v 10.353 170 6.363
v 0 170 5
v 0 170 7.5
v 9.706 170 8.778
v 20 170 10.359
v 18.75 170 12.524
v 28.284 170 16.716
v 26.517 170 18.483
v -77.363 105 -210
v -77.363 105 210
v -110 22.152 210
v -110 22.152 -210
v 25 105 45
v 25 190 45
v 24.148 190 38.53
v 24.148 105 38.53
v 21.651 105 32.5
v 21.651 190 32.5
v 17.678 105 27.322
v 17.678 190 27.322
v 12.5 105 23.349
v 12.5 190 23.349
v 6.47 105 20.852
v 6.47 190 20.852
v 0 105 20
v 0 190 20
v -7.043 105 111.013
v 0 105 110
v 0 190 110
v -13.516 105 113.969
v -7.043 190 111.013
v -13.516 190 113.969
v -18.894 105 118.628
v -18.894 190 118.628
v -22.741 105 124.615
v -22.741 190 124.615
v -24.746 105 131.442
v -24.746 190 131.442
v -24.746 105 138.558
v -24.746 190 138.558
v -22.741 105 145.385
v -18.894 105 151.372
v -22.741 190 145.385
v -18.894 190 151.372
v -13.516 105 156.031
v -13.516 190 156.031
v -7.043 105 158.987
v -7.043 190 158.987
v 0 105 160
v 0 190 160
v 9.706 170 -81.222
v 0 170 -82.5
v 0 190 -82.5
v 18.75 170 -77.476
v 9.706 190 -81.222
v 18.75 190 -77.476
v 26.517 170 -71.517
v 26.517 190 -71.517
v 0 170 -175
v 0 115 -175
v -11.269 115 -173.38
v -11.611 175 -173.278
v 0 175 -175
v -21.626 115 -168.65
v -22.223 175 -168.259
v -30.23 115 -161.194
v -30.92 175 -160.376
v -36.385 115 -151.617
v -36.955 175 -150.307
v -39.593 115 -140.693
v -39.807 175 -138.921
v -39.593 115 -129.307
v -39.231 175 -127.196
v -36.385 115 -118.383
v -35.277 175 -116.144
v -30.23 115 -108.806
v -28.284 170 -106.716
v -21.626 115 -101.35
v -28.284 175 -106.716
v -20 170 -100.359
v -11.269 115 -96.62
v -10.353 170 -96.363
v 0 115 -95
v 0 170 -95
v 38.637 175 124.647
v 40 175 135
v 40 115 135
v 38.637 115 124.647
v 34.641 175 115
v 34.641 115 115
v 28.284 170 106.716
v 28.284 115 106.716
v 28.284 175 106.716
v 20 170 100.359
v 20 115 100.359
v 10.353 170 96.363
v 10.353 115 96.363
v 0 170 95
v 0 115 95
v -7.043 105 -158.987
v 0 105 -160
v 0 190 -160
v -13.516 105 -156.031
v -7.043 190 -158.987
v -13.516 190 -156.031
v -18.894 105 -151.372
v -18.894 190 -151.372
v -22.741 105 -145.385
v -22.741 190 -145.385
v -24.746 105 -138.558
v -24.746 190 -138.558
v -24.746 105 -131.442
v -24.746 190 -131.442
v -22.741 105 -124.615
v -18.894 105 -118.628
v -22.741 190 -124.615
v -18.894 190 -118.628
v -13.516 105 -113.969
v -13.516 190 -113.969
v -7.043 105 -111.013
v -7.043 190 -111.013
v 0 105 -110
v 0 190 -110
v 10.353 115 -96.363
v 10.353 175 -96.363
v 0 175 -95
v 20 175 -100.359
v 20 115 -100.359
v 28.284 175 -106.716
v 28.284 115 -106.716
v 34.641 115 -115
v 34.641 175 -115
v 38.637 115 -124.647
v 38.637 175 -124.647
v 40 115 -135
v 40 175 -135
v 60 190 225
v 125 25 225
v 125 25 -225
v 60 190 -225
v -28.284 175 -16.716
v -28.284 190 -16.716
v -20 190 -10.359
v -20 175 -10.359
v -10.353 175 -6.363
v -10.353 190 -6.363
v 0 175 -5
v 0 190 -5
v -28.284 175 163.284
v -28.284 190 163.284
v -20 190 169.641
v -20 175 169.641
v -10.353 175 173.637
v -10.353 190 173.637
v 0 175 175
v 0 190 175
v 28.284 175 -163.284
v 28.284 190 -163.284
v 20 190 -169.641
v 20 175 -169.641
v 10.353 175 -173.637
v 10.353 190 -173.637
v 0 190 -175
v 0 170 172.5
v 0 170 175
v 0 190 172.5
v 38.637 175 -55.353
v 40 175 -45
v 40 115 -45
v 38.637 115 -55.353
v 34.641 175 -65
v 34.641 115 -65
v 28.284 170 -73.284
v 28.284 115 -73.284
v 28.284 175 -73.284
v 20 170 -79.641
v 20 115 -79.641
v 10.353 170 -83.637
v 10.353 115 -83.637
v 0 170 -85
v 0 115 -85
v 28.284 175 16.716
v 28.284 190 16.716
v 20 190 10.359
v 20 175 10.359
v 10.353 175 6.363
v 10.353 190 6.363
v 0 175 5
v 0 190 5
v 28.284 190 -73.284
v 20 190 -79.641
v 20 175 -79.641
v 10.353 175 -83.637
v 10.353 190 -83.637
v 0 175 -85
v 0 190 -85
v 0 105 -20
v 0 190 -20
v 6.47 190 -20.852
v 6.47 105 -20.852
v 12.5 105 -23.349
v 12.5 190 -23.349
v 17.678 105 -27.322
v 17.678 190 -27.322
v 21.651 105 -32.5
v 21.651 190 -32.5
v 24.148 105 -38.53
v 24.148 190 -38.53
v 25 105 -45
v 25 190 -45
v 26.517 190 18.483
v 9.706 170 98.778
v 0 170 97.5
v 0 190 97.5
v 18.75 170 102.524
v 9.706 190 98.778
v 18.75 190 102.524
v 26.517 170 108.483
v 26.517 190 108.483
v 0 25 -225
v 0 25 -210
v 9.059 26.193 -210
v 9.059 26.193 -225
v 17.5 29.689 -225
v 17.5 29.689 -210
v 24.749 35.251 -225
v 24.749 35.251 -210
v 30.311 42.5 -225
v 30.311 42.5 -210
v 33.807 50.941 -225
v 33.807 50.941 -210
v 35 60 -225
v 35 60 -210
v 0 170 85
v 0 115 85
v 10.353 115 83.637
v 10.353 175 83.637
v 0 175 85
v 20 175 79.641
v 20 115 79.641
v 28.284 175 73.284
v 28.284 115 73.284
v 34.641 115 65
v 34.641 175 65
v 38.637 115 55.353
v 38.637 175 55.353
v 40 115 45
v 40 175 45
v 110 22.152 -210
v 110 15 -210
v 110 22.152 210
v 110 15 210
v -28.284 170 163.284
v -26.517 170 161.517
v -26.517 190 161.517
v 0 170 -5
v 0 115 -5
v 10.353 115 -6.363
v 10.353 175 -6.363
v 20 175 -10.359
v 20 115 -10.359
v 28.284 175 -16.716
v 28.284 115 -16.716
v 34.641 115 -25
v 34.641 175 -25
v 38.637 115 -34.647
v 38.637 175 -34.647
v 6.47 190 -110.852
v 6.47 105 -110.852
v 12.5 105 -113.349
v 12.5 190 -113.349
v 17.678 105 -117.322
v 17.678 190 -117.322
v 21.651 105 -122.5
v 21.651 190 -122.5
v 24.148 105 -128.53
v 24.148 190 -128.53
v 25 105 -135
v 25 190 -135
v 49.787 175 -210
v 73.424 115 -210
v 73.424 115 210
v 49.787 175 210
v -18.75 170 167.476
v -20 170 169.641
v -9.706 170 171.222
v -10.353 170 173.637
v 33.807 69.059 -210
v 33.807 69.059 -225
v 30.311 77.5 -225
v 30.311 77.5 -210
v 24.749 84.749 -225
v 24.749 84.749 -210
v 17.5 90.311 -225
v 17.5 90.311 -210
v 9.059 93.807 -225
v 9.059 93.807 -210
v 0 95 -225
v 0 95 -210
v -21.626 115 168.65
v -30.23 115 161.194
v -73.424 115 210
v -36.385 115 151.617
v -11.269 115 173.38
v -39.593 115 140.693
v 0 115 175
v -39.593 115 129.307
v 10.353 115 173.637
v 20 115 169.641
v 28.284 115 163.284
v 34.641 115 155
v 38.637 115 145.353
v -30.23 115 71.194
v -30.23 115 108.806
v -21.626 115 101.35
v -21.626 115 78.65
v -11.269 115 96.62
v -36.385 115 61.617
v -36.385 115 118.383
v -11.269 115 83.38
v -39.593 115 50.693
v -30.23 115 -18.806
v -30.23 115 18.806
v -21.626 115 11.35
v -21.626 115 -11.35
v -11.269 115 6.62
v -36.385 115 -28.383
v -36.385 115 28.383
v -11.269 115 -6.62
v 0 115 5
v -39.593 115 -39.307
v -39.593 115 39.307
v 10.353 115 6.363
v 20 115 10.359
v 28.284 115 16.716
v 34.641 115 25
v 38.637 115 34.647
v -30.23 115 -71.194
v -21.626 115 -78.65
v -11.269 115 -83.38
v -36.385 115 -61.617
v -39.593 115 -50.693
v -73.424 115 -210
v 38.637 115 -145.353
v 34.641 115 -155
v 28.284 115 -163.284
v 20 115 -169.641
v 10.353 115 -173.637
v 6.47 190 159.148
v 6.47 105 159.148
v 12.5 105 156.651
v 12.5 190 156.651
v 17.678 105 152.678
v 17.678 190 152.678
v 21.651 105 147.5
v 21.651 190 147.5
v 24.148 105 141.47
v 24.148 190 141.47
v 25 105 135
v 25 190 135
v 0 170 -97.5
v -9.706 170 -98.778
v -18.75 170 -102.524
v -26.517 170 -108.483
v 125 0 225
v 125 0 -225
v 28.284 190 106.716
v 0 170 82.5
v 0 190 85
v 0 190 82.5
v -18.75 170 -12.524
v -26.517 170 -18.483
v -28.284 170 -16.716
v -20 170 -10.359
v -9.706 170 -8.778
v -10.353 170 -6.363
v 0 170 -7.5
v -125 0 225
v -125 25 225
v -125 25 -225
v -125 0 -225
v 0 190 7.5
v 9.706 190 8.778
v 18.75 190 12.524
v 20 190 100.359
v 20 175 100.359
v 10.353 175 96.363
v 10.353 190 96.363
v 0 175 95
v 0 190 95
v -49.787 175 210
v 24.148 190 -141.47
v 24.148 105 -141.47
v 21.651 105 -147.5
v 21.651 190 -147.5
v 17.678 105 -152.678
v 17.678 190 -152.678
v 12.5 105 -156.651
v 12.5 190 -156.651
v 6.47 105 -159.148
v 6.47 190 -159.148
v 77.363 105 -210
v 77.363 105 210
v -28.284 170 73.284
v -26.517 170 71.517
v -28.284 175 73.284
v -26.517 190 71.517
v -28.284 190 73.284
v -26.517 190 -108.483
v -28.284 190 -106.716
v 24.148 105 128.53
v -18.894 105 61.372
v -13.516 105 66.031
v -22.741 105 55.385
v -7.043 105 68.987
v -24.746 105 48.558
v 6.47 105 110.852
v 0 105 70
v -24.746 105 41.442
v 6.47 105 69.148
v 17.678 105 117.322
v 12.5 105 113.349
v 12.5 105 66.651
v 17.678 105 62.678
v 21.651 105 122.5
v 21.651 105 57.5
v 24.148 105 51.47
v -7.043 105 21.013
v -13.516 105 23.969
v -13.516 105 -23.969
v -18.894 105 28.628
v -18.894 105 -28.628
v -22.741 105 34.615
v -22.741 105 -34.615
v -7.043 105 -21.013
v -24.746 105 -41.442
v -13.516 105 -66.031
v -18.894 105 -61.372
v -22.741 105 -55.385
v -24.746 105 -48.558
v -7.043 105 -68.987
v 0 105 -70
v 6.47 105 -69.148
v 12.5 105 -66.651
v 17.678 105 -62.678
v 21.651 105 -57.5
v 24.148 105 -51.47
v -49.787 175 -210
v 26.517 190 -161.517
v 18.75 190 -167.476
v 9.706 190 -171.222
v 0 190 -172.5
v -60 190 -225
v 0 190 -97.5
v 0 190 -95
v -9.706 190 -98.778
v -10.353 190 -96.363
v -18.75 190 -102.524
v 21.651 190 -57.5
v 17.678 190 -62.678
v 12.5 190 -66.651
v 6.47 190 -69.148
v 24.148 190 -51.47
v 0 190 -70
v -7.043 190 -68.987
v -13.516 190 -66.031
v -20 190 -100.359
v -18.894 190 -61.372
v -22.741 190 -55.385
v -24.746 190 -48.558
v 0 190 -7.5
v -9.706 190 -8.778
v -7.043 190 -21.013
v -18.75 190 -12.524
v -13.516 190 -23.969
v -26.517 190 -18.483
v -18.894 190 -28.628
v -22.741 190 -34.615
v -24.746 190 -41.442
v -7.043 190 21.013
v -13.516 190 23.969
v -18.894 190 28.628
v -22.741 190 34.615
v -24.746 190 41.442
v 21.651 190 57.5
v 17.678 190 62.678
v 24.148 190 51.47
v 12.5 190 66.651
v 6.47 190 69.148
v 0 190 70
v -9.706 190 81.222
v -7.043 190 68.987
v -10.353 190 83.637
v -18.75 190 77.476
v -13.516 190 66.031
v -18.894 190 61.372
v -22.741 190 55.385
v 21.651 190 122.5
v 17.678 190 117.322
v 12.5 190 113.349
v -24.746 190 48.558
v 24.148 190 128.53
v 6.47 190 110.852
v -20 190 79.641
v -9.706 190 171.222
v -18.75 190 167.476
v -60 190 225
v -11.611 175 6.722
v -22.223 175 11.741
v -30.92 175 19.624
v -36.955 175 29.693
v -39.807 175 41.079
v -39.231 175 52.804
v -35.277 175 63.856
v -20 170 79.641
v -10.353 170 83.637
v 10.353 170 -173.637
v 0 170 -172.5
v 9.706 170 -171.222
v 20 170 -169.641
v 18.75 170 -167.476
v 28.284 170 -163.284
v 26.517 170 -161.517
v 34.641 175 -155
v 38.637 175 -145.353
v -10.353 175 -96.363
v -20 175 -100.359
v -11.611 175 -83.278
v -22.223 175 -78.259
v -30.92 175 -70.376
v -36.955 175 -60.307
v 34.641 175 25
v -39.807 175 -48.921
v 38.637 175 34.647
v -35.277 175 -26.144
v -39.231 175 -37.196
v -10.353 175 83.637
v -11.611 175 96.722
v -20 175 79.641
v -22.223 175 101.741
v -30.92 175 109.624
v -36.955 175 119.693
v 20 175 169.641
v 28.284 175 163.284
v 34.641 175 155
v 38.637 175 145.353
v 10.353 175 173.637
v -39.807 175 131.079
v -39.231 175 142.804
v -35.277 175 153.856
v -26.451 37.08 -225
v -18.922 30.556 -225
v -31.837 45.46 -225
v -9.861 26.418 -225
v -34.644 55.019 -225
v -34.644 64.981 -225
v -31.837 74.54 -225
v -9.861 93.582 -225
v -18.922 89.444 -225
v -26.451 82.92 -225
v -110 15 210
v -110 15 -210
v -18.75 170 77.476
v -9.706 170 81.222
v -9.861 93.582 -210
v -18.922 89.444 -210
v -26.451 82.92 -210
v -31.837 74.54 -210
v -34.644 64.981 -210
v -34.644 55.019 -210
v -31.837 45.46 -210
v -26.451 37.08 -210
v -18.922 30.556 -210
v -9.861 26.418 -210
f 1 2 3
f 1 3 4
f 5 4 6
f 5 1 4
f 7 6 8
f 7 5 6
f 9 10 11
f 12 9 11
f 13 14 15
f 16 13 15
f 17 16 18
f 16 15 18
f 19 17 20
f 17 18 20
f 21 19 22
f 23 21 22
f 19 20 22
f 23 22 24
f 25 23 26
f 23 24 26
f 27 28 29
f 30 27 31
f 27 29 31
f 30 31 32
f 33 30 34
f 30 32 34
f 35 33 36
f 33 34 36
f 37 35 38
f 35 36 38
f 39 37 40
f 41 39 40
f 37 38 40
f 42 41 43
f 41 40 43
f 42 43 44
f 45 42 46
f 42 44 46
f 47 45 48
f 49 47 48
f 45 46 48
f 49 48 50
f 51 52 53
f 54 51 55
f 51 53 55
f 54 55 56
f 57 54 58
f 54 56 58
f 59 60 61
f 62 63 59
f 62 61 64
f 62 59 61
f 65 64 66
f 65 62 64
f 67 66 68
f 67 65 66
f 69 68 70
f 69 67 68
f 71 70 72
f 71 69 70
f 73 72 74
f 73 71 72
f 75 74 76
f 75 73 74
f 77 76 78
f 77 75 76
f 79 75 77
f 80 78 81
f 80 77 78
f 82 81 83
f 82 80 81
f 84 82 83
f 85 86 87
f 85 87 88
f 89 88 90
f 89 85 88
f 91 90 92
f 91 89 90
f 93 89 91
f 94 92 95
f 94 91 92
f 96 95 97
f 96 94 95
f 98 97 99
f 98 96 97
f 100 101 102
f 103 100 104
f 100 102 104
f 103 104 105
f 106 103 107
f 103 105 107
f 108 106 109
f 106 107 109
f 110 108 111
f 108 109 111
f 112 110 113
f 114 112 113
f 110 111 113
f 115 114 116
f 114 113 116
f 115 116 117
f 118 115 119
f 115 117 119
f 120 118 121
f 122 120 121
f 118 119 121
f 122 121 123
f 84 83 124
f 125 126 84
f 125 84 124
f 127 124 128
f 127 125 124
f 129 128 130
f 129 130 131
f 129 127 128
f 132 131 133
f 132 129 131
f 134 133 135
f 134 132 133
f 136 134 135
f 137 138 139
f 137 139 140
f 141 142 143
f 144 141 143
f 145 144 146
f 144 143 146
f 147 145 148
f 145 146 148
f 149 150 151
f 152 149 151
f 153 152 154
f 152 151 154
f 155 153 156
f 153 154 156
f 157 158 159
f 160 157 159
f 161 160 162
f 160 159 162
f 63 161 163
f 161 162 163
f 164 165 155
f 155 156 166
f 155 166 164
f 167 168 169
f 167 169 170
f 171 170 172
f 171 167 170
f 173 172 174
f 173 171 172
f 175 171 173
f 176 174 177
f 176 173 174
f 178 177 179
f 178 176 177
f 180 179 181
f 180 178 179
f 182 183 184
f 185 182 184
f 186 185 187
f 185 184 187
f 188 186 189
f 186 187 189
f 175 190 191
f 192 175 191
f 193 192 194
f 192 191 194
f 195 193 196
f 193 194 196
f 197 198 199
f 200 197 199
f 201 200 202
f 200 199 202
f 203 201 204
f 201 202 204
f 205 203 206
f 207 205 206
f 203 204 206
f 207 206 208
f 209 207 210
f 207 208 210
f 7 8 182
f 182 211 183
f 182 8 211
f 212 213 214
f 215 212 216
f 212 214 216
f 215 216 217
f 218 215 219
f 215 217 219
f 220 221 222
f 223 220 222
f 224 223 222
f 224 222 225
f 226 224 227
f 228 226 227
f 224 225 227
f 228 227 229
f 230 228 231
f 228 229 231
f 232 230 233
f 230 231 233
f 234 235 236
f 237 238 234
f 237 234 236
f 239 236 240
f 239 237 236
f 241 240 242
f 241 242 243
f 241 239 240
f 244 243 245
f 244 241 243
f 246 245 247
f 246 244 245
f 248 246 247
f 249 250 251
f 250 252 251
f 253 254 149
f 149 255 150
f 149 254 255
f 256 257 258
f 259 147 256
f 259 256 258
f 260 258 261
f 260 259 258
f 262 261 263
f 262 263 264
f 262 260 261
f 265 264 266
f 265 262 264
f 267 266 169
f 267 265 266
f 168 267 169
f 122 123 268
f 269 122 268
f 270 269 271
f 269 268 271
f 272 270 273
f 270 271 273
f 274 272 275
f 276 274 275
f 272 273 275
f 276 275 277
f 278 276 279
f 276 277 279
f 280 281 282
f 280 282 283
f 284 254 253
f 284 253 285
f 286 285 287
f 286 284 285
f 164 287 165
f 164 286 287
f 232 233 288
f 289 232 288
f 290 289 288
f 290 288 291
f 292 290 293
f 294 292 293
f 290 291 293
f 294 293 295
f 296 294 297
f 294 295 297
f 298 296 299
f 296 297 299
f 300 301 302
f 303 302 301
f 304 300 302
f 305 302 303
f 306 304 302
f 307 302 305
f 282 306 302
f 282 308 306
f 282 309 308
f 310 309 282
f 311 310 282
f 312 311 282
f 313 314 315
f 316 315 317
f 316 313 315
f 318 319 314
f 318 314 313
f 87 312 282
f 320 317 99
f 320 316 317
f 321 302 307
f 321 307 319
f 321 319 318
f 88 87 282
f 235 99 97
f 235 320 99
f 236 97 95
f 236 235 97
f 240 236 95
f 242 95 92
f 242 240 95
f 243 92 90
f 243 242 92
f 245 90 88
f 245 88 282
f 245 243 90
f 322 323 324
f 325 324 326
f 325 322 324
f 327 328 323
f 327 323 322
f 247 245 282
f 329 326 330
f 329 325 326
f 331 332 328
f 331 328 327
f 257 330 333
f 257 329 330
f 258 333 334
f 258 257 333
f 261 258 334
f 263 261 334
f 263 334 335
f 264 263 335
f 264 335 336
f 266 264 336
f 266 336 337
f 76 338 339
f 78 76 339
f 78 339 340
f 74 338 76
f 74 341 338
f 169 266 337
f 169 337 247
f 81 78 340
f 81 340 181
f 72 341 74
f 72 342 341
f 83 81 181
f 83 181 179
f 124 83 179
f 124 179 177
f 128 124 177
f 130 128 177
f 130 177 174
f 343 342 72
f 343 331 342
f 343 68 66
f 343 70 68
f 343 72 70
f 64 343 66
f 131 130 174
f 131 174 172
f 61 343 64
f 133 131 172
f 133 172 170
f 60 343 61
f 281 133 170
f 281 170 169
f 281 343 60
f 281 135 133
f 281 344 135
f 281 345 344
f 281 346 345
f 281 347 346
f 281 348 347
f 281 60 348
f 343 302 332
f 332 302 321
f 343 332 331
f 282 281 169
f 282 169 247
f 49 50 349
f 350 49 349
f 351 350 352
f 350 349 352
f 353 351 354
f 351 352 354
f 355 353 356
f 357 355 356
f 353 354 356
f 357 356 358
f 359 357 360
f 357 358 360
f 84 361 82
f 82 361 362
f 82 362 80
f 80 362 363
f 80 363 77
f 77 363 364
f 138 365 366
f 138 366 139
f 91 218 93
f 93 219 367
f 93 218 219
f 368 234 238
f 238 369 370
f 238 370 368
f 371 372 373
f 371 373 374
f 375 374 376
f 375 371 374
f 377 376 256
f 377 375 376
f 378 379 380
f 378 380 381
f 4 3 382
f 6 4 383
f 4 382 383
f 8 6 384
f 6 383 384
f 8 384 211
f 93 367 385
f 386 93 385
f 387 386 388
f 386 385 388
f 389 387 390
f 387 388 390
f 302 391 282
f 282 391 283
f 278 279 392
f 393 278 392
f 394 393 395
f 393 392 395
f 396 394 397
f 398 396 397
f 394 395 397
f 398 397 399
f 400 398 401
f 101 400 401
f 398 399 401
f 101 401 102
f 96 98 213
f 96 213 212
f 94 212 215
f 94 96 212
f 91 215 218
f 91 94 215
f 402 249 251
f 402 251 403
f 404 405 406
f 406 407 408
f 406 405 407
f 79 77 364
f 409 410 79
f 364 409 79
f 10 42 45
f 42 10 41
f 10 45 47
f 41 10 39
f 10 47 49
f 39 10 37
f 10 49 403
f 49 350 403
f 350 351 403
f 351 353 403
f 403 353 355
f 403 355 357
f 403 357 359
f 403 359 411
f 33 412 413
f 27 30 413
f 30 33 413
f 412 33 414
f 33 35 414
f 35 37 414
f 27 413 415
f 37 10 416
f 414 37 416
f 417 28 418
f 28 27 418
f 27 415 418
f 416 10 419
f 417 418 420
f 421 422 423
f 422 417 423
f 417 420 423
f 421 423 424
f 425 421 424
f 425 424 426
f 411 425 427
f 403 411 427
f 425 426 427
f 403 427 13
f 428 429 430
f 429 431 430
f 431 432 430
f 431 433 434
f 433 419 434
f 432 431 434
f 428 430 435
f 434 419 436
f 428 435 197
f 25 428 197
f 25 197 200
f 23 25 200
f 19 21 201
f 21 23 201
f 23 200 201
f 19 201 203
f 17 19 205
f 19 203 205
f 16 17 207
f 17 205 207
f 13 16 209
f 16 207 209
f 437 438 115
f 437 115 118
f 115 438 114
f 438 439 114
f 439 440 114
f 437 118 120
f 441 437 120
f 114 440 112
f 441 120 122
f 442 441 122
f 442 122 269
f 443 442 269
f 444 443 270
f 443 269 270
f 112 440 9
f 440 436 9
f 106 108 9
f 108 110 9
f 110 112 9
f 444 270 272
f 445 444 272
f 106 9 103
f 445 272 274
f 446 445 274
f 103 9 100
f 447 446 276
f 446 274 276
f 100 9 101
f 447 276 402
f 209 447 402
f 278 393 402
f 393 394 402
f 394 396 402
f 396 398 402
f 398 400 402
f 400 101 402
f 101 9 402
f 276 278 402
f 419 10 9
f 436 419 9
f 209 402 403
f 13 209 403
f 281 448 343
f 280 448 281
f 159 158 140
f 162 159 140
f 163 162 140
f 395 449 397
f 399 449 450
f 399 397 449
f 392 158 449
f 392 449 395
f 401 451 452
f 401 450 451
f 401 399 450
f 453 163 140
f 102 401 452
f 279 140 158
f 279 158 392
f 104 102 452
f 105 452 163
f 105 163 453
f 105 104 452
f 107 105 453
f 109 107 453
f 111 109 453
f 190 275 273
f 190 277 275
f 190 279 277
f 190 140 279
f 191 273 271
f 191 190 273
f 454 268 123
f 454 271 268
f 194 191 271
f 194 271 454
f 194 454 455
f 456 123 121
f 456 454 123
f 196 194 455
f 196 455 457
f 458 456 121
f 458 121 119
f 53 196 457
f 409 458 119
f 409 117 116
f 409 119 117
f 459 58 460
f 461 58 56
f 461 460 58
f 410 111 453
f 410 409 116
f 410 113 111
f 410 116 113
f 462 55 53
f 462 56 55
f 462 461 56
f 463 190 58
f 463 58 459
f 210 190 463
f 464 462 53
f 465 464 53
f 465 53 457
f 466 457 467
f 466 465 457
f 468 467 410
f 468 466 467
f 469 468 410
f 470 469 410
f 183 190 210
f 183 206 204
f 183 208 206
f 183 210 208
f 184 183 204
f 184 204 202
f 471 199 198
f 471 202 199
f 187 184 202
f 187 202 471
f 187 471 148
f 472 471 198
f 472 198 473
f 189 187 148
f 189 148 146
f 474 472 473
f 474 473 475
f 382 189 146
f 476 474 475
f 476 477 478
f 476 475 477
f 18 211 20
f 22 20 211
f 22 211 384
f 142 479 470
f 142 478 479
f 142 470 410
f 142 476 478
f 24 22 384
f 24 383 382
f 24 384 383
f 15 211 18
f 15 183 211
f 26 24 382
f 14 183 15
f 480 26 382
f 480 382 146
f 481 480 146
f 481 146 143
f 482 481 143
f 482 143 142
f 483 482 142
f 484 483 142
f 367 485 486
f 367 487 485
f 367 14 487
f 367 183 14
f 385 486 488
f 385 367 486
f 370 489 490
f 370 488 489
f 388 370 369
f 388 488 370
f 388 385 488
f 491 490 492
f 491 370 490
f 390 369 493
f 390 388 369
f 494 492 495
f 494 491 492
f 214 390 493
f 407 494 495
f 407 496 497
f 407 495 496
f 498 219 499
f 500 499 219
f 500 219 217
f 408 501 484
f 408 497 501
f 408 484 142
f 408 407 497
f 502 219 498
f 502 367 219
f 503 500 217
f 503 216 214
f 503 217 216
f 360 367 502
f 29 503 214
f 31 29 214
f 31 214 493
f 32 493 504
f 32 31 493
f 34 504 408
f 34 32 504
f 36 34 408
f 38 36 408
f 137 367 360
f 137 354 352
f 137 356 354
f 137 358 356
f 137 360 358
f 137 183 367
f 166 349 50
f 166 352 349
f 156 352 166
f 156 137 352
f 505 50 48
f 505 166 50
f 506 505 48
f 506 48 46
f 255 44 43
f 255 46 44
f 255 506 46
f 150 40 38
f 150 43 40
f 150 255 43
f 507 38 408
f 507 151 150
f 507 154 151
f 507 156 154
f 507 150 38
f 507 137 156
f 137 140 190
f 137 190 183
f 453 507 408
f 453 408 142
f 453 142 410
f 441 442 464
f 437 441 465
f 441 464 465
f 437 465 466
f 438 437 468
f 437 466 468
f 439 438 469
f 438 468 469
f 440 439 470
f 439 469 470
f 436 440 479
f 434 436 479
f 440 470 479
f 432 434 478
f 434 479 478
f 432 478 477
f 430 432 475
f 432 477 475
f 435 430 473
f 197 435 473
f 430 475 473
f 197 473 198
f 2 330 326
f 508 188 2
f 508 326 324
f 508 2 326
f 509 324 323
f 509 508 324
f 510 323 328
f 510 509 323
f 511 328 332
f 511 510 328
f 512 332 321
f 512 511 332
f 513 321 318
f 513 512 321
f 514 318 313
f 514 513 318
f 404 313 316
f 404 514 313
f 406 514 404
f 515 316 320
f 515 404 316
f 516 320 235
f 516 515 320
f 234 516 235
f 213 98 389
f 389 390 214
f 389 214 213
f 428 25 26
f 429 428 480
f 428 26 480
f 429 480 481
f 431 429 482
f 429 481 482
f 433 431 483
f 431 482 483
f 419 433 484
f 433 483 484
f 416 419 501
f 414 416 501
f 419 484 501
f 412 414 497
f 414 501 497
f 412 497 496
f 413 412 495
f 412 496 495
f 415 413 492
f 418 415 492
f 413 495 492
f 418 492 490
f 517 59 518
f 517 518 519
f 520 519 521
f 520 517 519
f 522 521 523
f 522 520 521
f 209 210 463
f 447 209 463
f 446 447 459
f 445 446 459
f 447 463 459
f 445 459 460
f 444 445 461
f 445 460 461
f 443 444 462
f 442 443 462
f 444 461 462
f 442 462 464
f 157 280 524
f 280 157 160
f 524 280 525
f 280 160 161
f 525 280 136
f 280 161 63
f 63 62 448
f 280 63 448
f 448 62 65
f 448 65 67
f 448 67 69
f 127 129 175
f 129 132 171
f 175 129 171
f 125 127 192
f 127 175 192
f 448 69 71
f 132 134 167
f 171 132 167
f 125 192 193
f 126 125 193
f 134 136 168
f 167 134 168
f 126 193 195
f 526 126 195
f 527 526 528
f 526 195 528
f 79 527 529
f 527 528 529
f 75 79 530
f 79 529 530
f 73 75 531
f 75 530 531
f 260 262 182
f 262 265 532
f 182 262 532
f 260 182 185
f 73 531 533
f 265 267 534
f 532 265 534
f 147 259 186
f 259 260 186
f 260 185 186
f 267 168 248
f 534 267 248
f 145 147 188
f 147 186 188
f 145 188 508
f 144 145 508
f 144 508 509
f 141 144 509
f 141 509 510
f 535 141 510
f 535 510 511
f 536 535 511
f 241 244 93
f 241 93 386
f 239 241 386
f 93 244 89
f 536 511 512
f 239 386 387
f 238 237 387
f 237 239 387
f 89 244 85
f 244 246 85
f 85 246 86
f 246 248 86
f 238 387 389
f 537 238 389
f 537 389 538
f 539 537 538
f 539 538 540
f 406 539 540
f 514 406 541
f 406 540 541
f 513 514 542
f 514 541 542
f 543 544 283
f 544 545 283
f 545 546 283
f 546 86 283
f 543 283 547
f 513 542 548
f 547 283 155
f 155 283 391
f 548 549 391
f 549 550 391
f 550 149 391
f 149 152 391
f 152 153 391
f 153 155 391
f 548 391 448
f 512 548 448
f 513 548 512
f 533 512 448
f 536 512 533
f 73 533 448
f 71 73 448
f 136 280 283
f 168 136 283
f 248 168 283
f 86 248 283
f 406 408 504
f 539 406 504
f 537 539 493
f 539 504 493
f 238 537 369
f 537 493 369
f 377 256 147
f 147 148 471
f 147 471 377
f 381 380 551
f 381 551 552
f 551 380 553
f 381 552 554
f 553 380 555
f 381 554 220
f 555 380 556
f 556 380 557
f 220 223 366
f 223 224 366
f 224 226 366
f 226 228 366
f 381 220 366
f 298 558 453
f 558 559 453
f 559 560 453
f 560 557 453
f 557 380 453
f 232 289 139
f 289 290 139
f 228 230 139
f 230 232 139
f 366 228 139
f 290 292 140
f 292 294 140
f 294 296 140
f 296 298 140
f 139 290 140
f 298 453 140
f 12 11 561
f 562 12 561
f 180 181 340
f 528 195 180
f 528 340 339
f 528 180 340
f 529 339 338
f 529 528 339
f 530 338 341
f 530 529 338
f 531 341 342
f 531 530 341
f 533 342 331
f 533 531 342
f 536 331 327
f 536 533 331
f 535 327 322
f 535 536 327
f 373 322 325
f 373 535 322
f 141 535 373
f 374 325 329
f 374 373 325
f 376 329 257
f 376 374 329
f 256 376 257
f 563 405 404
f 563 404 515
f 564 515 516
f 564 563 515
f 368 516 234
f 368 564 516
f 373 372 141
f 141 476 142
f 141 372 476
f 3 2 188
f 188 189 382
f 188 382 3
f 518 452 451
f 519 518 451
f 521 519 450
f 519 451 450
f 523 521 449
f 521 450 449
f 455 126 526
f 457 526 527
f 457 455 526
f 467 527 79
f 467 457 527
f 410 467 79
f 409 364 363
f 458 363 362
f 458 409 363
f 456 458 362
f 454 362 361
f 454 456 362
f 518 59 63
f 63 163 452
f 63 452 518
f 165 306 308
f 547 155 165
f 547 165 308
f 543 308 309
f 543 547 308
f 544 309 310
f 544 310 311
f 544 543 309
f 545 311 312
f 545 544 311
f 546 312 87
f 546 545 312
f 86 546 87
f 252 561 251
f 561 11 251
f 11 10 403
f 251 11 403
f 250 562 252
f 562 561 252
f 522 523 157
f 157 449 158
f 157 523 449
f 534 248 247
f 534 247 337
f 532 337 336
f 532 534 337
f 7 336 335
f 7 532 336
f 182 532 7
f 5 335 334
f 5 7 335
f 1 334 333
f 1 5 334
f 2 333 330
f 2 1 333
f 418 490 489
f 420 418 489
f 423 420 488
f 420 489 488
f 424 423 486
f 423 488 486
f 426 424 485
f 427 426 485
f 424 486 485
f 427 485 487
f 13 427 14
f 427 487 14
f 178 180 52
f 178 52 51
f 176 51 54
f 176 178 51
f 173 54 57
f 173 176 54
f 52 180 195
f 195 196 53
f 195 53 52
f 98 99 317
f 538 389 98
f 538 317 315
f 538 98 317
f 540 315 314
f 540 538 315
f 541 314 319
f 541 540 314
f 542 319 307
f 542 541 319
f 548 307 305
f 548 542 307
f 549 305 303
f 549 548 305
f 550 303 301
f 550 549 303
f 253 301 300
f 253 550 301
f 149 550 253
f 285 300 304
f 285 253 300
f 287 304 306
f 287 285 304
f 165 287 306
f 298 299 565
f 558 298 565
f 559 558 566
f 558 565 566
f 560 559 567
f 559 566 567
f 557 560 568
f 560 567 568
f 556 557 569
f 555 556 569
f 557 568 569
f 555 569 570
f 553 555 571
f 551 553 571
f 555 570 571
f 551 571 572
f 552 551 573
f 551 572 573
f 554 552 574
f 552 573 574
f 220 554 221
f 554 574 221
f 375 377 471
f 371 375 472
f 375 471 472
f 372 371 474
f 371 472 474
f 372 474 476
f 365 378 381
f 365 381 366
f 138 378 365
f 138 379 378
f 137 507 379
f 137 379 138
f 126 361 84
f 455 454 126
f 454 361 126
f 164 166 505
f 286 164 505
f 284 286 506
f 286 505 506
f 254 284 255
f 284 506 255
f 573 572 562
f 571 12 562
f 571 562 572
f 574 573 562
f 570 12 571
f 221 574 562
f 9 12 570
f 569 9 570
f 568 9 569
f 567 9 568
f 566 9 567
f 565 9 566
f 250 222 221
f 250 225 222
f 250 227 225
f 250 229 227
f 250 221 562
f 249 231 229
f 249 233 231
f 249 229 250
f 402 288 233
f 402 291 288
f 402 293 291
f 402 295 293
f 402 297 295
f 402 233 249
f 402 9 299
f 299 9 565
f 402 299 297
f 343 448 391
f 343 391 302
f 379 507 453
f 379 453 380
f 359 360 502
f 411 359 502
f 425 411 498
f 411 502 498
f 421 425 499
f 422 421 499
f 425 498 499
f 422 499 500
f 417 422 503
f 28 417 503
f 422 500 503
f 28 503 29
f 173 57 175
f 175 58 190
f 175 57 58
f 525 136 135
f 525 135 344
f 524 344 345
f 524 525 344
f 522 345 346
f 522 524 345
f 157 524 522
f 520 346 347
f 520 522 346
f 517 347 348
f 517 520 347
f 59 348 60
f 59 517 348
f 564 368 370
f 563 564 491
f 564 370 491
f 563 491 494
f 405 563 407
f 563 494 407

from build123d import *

# Parameters (mm, degrees)
ESTRUSIONE_ESTRUSIONE1_DEPTH = 225
TAGLIO_ESTRUSIONE1_DEPTH     = 90
SVUOTA1_T                    = -15
TAGLIO_ESTRUSIONE2_START     = -20
SCHIZZO4_R                   = 40
TAGLIO_ESTRUSIONE2_DEPTH     = 20
ESTRUSIONE_ESTRUSIONE2_START = 10
SCHIZZO6_W                   = 154.725791786
SCHIZZO6_H                   = 435
SCHIZZO6_R                   = 40
ESTRUSIONE_ESTRUSIONE2_DEPTH = 10
ESTRUSIONE_ESTRUSIONE3_DEPTH = 15
TAGLIO_ESTRUSIONE12_DEPTH    = 491.866580651
TAGLIO_ESTRUSIONE13_DEPTH    = 20


with BuildPart() as part:
    # Schizzo1 → Estrusione-Estrusione1 (new, symmetric)
    with BuildSketch(Plane.XY):
        Polygon((-125, 0), (125, 0), (125, 25), (60, 190), (-60, 190), (-125, 25), align=None)
    extrude(amount=ESTRUSIONE_ESTRUSIONE1_DEPTH, both=True)

    # Schizzo2 → Taglio-Estrusione1 (cut)
    with BuildSketch(Plane(origin=(0, 190, 0), x_dir=(1, 0, 0), z_dir=(0, 1, 0))):
        with BuildLine():
            ThreePointArc((0, -110), (-25, -135), (0, -160))
            Line((0, -160), (0, -135))
            Line((0, -135), (0, -110))
        make_face()
        with BuildLine():
            Line((0, -135), (0, -160))
            ThreePointArc((0, -160), (17.67766953, -152.67766953), (25, -135))
            ThreePointArc((25, -135), (17.67766953, -117.32233047), (0, -110))
            Line((0, -110), (0, -135))
        make_face()
        with BuildLine():
            ThreePointArc((0, -20), (-25, -45), (0, -70))
            Line((0, -70), (0, -45))
            Line((0, -45), (0, -20))
        make_face()
        with BuildLine():
            Line((0, -45), (0, -70))
            ThreePointArc((0, -70), (17.67766953, -62.67766953), (25, -45))
            ThreePointArc((25, -45), (17.67766953, -27.32233047), (0, -20))
            Line((0, -20), (0, -45))
        make_face()
        with BuildLine():
            ThreePointArc((0, 70), (-25, 45), (0, 20))
            Line((0, 20), (0, 45))
            Line((0, 45), (0, 70))
        make_face()
        with BuildLine():
            Line((0, 45), (0, 20))
            ThreePointArc((0, 20), (17.67766953, 27.32233047), (25, 45))
            ThreePointArc((25, 45), (17.67766953, 62.67766953), (0, 70))
            Line((0, 70), (0, 45))
        make_face()
        with BuildLine():
            ThreePointArc((0, 160), (-25, 135), (0, 110))
            Line((0, 110), (0, 135))
            Line((0, 135), (0, 160))
        make_face()
        with BuildLine():
            Line((0, 135), (0, 110))
            ThreePointArc((0, 110), (17.67766953, 117.32233047), (25, 135))
            ThreePointArc((25, 135), (17.67766953, 152.67766953), (0, 160))
            Line((0, 160), (0, 135))
        make_face()
    extrude(amount=-TAGLIO_ESTRUSIONE1_DEPTH, mode=Mode.SUBTRACT)

    # Svuota1
    svuota1_openings = [part.faces().sort_by_distance(p)[0] for p in [
        (0, 83.334466349, 225),
    ]]
    offset(amount=SVUOTA1_T, openings=svuota1_openings, kind=Kind.INTERSECTION)

    # Schizzo4 → Taglio-Estrusione2 (cut)
    with BuildSketch(Plane.XZ.offset(-85).offset(TAGLIO_ESTRUSIONE2_START)):
        with Locations(Location((0, -135, 0), (0, 0, 90))):
            Circle(SCHIZZO4_R)
        with Locations(Location((0, -45, 0), (0, 0, 90))):
            Circle(SCHIZZO4_R)
        with Locations(Location((0, 45, 0), (0, 0, 90))):
            Circle(SCHIZZO4_R)
        with Locations(Location((0, 135, 0), (0, 0, 90))):
            Circle(SCHIZZO4_R)
    extrude(amount=TAGLIO_ESTRUSIONE2_DEPTH, mode=Mode.SUBTRACT)

    # Schizzo6 → Estrusione-Estrusione2 (add)
    with BuildSketch(Plane(origin=(0, 105, 0), x_dir=(1, 0, 0), z_dir=(0, 1, 0)).offset(ESTRUSIONE_ESTRUSIONE2_START)):
        with Locations((0, -7.5)):
            Rectangle(SCHIZZO6_W, SCHIZZO6_H)
        with Locations(Location((0, 135, 0), (0, 0, 270))):
            Circle(SCHIZZO6_R, mode=Mode.SUBTRACT)
        with Locations(Location((0, 45, 0), (0, 0, 270))):
            Circle(SCHIZZO6_R, mode=Mode.SUBTRACT)
        with Locations(Location((0, -45, 0), (0, 0, 270))):
            Circle(SCHIZZO6_R, mode=Mode.SUBTRACT)
        with Locations(Location((0, -135, 0), (0, 0, 270))):
            Circle(SCHIZZO6_R, mode=Mode.SUBTRACT)
    extrude(amount=-ESTRUSIONE_ESTRUSIONE2_DEPTH)

    # Schizzo7 → Estrusione-Estrusione3 (add)
    with BuildSketch(Plane.XY.offset(225)):
        Polygon((-125, 25), (-125, 0), (125, 0), (125, 25), (60, 190), (-60, 190), align=None)
    extrude(amount=-ESTRUSIONE_ESTRUSIONE3_DEPTH)

    # Schizzo12 → Taglio-Estrusione12 (cut, through all)
    with BuildSketch(Plane.XY.offset(-210)):
        with BuildLine():
            ThreePointArc((35, 60), (24.748737342, 84.748737342), (0, 95))
            Line((0, 95), (0, 25))
            ThreePointArc((0, 25), (24.748737342, 35.251262658), (35, 60))
        make_face()
        with BuildLine():
            Line((0, 25), (0, 95))
            ThreePointArc((0, 95), (-35, 60), (0, 25))
        make_face()
    extrude(amount=-TAGLIO_ESTRUSIONE12_DEPTH, mode=Mode.SUBTRACT)

    # Schizzo13 → Taglio-Estrusione13 (cut)
    with BuildSketch(Plane(origin=(0, 190, 0), x_dir=(1, 0, 0), z_dir=(0, 1, 0))):
        with BuildLine():
            Line((0, 97.5), (0, 95))
            ThreePointArc((0, 95), (-15.307337295, 98.0448187), (-28.284271247, 106.715728753))
            Line((-28.284271247, 106.715728753), (-26.516504294, 108.483495706))
            ThreePointArc((-26.516504294, 108.483495706), (-14.350628714, 100.354517531), (0, 97.5))
        make_face()
        with BuildLine():
            Line((26.516504294, 161.516504294), (28.284271247, 163.284271247))
            ThreePointArc((28.284271247, 163.284271247), (15.307337295, 171.9551813), (0, 175))
            Line((0, 175), (0, 172.5))
            ThreePointArc((0, 172.5), (14.350628714, 169.645482469), (26.516504294, 161.516504294))
        make_face()
        with BuildLine():
            Line((-26.516504294, 18.483495706), (-28.284271247, 16.715728753))
            ThreePointArc((-28.284271247, 16.715728753), (-15.307337295, 8.0448187), (0, 5))
            Line((0, 5), (0, 7.5))
            ThreePointArc((0, 7.5), (-14.350628714, 10.354517531), (-26.516504294, 18.483495706))
        make_face()
        with BuildLine():
            Line((26.516504294, 71.516504294), (28.284271247, 73.284271247))
            ThreePointArc((28.284271247, 73.284271247), (15.307337295, 81.9551813), (0, 85))
            Line((0, 85), (0, 82.5))
            ThreePointArc((0, 82.5), (14.350628714, 79.645482469), (26.516504294, 71.516504294))
        make_face()
        with BuildLine():
            Line((-26.516504294, -71.516504294), (-28.284271247, -73.284271247))
            ThreePointArc((-28.284271247, -73.284271247), (-15.307337295, -81.9551813), (0, -85))
            Line((0, -85), (0, -82.5))
            ThreePointArc((0, -82.5), (-14.350628714, -79.645482469), (-26.516504294, -71.516504294))
        make_face()
        with BuildLine():
            Line((26.516504294, -18.483495706), (28.284271247, -16.715728753))
            ThreePointArc((28.284271247, -16.715728753), (15.307337295, -8.0448187), (0, -5))
            Line((0, -5), (0, -7.5))
            ThreePointArc((0, -7.5), (14.350628714, -10.354517531), (26.516504294, -18.483495706))
        make_face()
        with BuildLine():
            Line((-26.516504294, -161.516504294), (-28.284271247, -163.284271247))
            ThreePointArc((-28.284271247, -163.284271247), (-15.307337295, -171.9551813), (0, -175))
            Line((0, -175), (0, -172.5))
            ThreePointArc((0, -172.5), (-14.350628714, -169.645482469), (-26.516504294, -161.516504294))
        make_face()
        with BuildLine():
            Line((26.516504294, -108.483495706), (28.284271247, -106.715728753))
            ThreePointArc((28.284271247, -106.715728753), (15.307337295, -98.0448187), (0, -95))
            Line((0, -95), (0, -97.5))
            ThreePointArc((0, -97.5), (14.350628714, -100.354517531), (26.516504294, -108.483495706))
        make_face()
    extrude(amount=-TAGLIO_ESTRUSIONE13_DEPTH, mode=Mode.SUBTRACT)


solid = part.part
